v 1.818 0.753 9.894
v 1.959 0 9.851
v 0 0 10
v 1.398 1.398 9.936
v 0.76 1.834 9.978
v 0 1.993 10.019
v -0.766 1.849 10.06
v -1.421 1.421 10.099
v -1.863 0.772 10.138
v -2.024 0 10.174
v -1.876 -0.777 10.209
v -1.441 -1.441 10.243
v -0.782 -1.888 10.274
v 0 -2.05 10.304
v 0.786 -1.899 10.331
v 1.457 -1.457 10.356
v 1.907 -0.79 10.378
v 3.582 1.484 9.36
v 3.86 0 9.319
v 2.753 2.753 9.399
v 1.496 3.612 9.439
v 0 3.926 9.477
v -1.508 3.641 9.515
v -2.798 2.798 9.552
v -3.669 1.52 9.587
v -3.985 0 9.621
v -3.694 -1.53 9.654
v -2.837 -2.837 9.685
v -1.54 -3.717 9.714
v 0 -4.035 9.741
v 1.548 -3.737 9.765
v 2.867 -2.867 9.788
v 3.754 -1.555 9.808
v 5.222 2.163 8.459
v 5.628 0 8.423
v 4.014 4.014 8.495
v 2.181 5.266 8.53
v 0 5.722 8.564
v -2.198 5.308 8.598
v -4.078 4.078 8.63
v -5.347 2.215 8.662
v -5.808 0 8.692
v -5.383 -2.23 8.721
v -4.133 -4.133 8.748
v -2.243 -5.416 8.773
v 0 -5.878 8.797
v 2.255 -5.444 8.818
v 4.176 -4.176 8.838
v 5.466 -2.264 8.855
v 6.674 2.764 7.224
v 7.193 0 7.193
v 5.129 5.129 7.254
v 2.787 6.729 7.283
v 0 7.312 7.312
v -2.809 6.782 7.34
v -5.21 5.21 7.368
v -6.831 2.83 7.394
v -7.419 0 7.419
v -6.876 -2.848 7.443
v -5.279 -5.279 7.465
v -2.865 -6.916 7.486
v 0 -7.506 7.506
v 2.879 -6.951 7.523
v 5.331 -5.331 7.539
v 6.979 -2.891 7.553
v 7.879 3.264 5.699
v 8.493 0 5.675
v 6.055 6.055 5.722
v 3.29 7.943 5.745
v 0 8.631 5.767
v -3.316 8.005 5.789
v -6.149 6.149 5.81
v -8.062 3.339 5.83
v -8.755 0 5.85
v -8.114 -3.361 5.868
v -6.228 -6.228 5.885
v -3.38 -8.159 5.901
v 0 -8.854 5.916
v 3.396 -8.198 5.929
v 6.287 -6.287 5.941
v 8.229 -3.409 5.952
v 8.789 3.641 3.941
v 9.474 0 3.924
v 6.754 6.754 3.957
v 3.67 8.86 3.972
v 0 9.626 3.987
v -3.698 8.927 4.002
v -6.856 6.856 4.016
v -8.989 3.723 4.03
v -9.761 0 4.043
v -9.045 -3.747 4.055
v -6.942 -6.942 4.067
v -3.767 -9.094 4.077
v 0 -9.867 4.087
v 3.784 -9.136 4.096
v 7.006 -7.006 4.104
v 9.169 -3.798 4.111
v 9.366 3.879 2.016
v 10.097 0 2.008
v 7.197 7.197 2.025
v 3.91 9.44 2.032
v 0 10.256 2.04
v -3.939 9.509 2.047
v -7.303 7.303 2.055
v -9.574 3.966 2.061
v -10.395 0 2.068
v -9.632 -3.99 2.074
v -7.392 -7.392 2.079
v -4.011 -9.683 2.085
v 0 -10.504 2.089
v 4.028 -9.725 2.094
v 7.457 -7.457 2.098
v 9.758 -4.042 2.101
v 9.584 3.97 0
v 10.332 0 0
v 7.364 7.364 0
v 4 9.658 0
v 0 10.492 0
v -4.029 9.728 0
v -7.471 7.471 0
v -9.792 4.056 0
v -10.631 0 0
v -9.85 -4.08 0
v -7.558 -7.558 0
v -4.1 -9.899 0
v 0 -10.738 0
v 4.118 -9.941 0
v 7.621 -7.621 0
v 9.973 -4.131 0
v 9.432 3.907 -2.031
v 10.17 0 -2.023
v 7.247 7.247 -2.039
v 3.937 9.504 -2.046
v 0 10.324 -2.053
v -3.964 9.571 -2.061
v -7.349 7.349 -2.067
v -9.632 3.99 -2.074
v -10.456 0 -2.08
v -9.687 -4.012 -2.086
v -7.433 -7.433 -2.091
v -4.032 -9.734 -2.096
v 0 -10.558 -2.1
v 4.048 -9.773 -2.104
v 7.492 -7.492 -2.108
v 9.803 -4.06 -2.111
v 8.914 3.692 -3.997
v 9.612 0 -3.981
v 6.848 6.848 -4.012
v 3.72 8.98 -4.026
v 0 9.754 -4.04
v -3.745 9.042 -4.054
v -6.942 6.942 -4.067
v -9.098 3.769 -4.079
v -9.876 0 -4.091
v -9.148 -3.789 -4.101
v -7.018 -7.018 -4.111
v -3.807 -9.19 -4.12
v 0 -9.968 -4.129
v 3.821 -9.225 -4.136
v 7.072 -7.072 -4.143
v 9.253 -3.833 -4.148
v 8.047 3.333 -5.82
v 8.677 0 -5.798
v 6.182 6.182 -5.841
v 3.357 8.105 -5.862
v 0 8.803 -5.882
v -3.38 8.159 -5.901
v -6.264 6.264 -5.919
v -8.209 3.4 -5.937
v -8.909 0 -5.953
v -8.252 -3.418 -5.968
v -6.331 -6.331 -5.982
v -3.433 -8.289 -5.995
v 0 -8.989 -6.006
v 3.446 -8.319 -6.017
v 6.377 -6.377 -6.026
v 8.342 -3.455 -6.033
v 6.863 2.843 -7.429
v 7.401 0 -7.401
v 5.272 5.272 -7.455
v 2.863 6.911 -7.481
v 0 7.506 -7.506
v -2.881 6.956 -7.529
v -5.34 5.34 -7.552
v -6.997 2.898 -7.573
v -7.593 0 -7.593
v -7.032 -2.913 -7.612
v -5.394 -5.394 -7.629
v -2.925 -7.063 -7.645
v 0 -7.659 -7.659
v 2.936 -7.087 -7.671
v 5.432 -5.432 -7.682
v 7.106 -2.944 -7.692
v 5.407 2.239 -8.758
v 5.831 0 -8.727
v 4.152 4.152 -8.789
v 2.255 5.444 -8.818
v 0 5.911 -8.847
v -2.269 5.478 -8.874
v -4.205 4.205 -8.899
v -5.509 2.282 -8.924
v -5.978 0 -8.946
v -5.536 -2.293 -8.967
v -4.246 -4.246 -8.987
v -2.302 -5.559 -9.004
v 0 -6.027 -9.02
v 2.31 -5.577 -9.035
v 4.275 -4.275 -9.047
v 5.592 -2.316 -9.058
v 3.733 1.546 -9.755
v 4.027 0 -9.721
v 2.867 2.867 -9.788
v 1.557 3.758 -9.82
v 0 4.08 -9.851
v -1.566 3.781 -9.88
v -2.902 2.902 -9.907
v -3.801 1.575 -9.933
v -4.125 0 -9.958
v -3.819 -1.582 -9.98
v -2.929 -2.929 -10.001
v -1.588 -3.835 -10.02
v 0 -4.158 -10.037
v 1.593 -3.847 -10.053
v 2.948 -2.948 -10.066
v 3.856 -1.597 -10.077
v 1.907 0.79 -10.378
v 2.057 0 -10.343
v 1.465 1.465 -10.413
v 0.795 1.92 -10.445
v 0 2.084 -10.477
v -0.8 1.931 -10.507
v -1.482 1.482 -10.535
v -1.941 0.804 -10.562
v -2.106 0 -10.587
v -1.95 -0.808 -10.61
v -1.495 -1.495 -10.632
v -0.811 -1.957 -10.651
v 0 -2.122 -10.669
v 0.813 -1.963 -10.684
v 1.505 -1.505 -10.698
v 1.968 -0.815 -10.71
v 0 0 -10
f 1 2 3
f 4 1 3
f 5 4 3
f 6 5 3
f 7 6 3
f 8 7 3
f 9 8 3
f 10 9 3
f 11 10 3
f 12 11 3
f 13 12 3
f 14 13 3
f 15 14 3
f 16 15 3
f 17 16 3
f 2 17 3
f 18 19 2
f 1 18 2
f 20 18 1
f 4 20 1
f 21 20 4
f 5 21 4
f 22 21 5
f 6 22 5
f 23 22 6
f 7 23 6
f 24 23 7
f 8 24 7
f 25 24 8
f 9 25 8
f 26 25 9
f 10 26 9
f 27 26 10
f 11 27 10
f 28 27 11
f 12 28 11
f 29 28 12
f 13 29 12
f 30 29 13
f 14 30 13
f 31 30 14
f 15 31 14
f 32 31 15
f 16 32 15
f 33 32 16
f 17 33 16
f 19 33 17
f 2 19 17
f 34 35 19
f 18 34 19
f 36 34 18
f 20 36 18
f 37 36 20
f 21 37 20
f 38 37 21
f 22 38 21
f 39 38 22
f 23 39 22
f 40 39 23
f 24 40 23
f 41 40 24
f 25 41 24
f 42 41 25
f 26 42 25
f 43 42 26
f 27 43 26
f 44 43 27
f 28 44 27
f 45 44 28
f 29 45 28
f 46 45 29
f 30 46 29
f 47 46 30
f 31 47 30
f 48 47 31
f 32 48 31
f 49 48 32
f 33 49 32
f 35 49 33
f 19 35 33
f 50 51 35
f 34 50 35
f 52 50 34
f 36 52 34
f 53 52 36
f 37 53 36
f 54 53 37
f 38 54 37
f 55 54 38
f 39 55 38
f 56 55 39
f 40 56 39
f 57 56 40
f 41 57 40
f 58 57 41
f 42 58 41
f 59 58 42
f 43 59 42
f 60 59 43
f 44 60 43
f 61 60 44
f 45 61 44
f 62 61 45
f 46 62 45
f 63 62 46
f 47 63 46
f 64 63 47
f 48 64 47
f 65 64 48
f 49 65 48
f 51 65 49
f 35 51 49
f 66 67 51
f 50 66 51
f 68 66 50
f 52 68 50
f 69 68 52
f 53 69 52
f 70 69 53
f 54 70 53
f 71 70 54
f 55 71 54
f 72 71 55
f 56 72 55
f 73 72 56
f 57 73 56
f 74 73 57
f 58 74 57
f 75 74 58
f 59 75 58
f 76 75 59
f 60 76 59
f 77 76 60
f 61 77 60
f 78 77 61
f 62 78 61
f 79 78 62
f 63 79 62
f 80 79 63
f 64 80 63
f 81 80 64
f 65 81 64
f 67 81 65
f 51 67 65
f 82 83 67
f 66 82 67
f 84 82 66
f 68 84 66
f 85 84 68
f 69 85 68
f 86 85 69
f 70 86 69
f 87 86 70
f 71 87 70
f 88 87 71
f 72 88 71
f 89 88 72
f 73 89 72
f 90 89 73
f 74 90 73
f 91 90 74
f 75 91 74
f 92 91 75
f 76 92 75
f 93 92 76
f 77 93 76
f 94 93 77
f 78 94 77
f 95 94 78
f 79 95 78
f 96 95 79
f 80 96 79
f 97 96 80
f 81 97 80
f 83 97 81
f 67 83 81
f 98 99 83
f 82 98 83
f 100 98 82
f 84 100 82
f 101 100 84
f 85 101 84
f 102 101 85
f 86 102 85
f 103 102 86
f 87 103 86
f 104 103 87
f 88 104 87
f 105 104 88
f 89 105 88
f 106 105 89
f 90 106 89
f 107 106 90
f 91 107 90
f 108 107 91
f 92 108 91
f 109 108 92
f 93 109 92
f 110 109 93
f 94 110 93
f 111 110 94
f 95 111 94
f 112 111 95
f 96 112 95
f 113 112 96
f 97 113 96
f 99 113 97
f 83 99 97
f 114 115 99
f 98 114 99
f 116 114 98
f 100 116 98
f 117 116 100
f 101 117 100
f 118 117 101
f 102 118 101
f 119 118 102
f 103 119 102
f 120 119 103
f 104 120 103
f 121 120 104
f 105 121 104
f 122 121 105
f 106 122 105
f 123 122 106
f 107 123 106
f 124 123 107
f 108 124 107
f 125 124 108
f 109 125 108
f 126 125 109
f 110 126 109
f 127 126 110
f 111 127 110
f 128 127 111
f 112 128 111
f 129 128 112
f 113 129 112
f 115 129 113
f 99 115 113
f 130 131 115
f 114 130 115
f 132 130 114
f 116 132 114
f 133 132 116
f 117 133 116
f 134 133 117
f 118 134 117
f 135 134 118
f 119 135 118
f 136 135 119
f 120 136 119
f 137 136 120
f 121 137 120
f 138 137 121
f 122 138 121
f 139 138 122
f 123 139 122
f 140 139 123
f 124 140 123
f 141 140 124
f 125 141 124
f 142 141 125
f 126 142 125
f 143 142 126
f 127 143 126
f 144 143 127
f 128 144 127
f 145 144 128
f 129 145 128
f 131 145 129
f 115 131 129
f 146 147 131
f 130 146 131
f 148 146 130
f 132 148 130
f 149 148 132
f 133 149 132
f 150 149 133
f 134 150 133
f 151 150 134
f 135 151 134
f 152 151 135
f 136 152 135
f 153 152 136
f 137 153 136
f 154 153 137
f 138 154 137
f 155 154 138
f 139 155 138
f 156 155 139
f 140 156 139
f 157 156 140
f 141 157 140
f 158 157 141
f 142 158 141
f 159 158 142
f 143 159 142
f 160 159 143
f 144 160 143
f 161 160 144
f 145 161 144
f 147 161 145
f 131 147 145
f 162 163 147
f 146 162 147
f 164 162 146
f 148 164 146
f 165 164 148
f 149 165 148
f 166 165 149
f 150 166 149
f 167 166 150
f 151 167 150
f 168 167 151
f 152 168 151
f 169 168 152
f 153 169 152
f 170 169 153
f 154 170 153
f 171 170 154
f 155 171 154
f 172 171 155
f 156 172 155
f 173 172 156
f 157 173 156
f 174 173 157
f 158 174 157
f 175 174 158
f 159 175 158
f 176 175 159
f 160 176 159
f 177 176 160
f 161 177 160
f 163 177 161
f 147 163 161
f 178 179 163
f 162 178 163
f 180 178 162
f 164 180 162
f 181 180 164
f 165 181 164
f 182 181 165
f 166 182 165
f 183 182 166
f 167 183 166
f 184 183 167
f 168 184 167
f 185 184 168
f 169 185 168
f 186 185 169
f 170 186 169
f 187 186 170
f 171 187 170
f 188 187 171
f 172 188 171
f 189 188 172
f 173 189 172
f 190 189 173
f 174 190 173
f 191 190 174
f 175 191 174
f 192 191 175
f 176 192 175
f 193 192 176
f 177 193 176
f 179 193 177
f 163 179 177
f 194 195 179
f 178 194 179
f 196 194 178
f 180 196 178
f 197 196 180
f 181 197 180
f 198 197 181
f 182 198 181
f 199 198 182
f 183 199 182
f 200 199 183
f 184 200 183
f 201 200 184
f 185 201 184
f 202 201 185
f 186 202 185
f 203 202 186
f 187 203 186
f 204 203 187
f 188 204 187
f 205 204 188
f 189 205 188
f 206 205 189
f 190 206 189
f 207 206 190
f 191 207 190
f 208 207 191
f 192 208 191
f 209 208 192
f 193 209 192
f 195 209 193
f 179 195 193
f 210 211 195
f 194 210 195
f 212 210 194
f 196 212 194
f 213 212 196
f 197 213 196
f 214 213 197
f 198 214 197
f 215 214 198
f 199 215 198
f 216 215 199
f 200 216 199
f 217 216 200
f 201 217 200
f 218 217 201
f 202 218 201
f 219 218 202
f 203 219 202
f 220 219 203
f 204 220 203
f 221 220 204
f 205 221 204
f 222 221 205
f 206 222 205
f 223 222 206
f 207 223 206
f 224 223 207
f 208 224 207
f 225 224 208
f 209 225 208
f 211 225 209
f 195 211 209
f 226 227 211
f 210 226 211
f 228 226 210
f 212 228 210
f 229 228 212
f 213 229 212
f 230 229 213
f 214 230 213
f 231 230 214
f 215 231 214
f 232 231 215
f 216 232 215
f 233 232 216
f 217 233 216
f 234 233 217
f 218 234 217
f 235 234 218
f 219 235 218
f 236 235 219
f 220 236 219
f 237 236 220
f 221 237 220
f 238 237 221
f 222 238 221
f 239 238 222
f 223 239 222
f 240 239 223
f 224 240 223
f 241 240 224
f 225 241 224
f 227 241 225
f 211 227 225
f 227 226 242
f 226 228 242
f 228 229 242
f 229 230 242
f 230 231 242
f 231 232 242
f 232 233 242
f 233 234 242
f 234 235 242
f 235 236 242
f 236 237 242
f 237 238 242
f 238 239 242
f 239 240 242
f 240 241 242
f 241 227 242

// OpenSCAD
a_a_n_perlinvalue = [[0,0.04371501049860007,0.08722033582083583,0.13030754843957779,0.1727707290807501,0.21440770326171876,0.25502125679503873,0.2944203233645525,0.33242113738244095,0.36884834546283424,0.40353607,0.4363289185169384,0.4670828652695111,0.49566331659243307,0.5219399106061818,0.5457870263690396],[0.04371501049860007,0.08736008397760227,0.13072578697513126,0.1736041944028,0.21579013813823242,0.25708244055352997,0.2972851260189389,0.3362086035,0.3736708134708937,0.4094983324965232,0.44352742899110886,0.4756050638417031,0.5055898262476604,0.5333514795878082,0.5587654976458403,0.5817116150984001],[0.08722033582083583,0.13072578697513126,0.17388268513394686,0.21648385713099633,0.2583251328672,0.29920657483436763,0.33893368463359996,0.37731857962080306,0.41418113291896314,0.4493500701694812,0.48266401655291896,0.5139724877929687,0.5431368190663115,0.5700306131736044,0.594535517650221,0.6165374349016378],[0.13030754843957779,0.1736041944028,0.21648385713099633,0.25874036305528986,0.30017078456640633,0.3405766645435481,0.37976521690839377,0.41755049635354713,0.4537545305048455,0.48820840791239994,0.5207533154261265,0.5512415186978,0.5795372797633448,0.6055176397863267,0.6290707290220647,0.6500943989537166],[0.1727707290807501,0.21579013813823242,0.2583251328672,0.30017078456640633,0.34112564958560265,0.38099298787562946,0.41958195660613135,0.4567087720199813,0.49219783280639995,0.5258827984130457,0.5576076158810573,0.587227488976129,0.6146097849201343,0.6396359210111869,0.662206554837258,0.6822373371170211],[0.21440770326171876,0.25708244055352997,0.29920657483436763,0.3405766645435481,0.38099298787562946,0.420260754375,0.45819129065389763,0.4946031934255237,0.5293234431596393,0.5621884718091422,0.5930451782226563,0.6217518953257596,0.6481810427002465,0.6722263455320789,0.6938039866789638,0.7128460828882642],[0.25502125679503873,0.2972851260189389,0.33893368463359996,0.37976521690839377,0.41958195660613135,0.45819129065389763,0.4954069360076391,0.5310500829275687,0.564950498,0.596947580385157,0.6268913931238593,0.6546460632805907,0.6800976523990508,0.7031550090100233,0.7237476359875729,0.7418217091016776],[0.2944203233645525,0.3362086035,0.37731857962080306,0.41755049635354713,0.4567087720199813,0.4946031934255237,0.5310500829275687,0.5658734310288795,0.5989059878627291,0.6299903536522652,0.6589829829723339,0.6857626661044685,0.7102310964581715,0.7323106032945793,0.7519421754146434,0.7690832226289727],[0.33242113738244095,0.3736708134708937,0.41418113291896314,0.4537545305048455,0.49219783280639995,0.5293234431596393,0.564950498,0.5989059878627291,0.6310258907814842,0.6611595456661254,0.6891788234523578,0.7149786937642968,0.7384747958145947,0.7596013262028135,0.7783092430338908,0.7945646957210145],[0.36884834546283424,0.4094983324965232,0.4493500701694812,0.48820840791239994,0.5258827984130457,0.5621884718091422,0.596947580385157,0.6299903536522652,0.6611595456661254,0.6903204096764137,0.717361594055863,0.742192541698995,0.7647412196968839,0.7849521911726265,0.8027849928725258,0.8182127836777608],[0.40353607,0.44352742899110886,0.48266401655291896,0.5207533154261265,0.5576076158810573,0.5930451782226563,0.6268913931238593,0.6589829829723339,0.6891788234523578,0.717361594055863,0.7434350064739345,0.7673213527036792,0.7889594223669012,0.8083027515319886,0.8253181669599302,0.8399845913248927],[0.4363289185169384,0.4756050638417031,0.5139724877929687,0.5512415186978,0.587227488976129,0.6217518953257596,0.6546460632805907,0.6857626661044685,0.7149786937642968,0.742192541698995,0.7673213527036792,0.7902987562872568,0.8110729664912164,0.8296052007869339,0.8458683842983014,0.8598461052260215],[0.4670828652695111,0.5055898262476604,0.5431368190663115,0.5795372797633448,0.6146097849201343,0.6481810427002465,0.6800976523990508,0.7102310964581715,0.7384747958145947,0.7647412196968839,0.7889594223669012,0.8110729664912164,0.8310381944558989,0.8488228105679042,0.8644047387157759,0.877771221691901],[0.49566331659243307,0.5333514795878082,0.5700306131736044,0.6055176397863267,0.6396359210111869,0.6722263455320789,0.7031550090100233,0.7323106032945793,0.7596013262028135,0.7849521911726265,0.8083027515319886,0.8296052007869339,0.8488228105679042,0.8659286695035595,0.8809046879206804,0.8937408348982974],[0.5219399106061818,0.5587654976458403,0.594535517650221,0.6290707290220647,0.662206554837258,0.6938039866789638,0.7237476359875729,0.7519421754146434,0.7783092430338908,0.8027849928725258,0.8253181669599302,0.8458683842983014,0.8644047387157759,0.8809046879206804,0.8953531989814297,0.9077421170861273],[0.5457870263690396,0.5817116150984001,0.6165374349016378,0.6500943989537166,0.6822373371170211,0.7128460828882642,0.7418217091016776,0.7690832226289727,0.7945646957210145,0.8182127836777608,0.8399845913248927,0.8598461052260215,0.877771221691901,0.8937408348982974,0.9077421170861273,0.9197680131397817]];


module custom_sphere(r = 10, lat_divs = 16, lon_divs = 16) {
    // Generate points
    points = [
        [0, 0, r],  // top pole
        for (lat = [1:lat_divs-1])
            for (lon = [0:lon_divs-1])
                let(
                    theta = lat * 180 / lat_divs,
                    phi = lon * 360 / lon_divs, 
                    r_offset = a_a_n_perlinvalue[lat][lon],
                    r2 = r+r_offset
                )
                [
                    r2 * sin(theta) * cos(phi),
                    r2 * sin(theta) * sin(phi),
                    r2 * cos(theta)
                ],
        [0, 0, -r]  // bottom pole
    ];
    
    // Generate faces
    faces = concat(
        // Top cap triangles
        [for (lon = [0:lon_divs-1])
            [0, 1 + lon, 1 + (lon + 1) % lon_divs]
        ],
        
        // Middle quads (as two triangles each)
        [for (lat = [0:lat_divs-3])
            for (lon = [0:lon_divs-1])
                let(
                    tl = 1 + lat * lon_divs + lon,
                    tr = 1 + lat * lon_divs + (lon + 1) % lon_divs,
                    bl = 1 + (lat + 1) * lon_divs + lon,
                    br = 1 + (lat + 1) * lon_divs + (lon + 1) % lon_divs
                )
                each [[tl, bl, br], [tl, br, tr]]
        ],
        
        // Bottom cap triangles
        [for (lon = [0:lon_divs-1])
            let(bottom_ring_start = 1 + (lat_divs - 2) * lon_divs)
            [len(points) - 1, bottom_ring_start + (lon + 1) % lon_divs, bottom_ring_start + lon]
        ]
    );
    
    polyhedron(points, faces);
}

custom_sphere(r = 10, lat_divs = 16, lon_divs = 16);
